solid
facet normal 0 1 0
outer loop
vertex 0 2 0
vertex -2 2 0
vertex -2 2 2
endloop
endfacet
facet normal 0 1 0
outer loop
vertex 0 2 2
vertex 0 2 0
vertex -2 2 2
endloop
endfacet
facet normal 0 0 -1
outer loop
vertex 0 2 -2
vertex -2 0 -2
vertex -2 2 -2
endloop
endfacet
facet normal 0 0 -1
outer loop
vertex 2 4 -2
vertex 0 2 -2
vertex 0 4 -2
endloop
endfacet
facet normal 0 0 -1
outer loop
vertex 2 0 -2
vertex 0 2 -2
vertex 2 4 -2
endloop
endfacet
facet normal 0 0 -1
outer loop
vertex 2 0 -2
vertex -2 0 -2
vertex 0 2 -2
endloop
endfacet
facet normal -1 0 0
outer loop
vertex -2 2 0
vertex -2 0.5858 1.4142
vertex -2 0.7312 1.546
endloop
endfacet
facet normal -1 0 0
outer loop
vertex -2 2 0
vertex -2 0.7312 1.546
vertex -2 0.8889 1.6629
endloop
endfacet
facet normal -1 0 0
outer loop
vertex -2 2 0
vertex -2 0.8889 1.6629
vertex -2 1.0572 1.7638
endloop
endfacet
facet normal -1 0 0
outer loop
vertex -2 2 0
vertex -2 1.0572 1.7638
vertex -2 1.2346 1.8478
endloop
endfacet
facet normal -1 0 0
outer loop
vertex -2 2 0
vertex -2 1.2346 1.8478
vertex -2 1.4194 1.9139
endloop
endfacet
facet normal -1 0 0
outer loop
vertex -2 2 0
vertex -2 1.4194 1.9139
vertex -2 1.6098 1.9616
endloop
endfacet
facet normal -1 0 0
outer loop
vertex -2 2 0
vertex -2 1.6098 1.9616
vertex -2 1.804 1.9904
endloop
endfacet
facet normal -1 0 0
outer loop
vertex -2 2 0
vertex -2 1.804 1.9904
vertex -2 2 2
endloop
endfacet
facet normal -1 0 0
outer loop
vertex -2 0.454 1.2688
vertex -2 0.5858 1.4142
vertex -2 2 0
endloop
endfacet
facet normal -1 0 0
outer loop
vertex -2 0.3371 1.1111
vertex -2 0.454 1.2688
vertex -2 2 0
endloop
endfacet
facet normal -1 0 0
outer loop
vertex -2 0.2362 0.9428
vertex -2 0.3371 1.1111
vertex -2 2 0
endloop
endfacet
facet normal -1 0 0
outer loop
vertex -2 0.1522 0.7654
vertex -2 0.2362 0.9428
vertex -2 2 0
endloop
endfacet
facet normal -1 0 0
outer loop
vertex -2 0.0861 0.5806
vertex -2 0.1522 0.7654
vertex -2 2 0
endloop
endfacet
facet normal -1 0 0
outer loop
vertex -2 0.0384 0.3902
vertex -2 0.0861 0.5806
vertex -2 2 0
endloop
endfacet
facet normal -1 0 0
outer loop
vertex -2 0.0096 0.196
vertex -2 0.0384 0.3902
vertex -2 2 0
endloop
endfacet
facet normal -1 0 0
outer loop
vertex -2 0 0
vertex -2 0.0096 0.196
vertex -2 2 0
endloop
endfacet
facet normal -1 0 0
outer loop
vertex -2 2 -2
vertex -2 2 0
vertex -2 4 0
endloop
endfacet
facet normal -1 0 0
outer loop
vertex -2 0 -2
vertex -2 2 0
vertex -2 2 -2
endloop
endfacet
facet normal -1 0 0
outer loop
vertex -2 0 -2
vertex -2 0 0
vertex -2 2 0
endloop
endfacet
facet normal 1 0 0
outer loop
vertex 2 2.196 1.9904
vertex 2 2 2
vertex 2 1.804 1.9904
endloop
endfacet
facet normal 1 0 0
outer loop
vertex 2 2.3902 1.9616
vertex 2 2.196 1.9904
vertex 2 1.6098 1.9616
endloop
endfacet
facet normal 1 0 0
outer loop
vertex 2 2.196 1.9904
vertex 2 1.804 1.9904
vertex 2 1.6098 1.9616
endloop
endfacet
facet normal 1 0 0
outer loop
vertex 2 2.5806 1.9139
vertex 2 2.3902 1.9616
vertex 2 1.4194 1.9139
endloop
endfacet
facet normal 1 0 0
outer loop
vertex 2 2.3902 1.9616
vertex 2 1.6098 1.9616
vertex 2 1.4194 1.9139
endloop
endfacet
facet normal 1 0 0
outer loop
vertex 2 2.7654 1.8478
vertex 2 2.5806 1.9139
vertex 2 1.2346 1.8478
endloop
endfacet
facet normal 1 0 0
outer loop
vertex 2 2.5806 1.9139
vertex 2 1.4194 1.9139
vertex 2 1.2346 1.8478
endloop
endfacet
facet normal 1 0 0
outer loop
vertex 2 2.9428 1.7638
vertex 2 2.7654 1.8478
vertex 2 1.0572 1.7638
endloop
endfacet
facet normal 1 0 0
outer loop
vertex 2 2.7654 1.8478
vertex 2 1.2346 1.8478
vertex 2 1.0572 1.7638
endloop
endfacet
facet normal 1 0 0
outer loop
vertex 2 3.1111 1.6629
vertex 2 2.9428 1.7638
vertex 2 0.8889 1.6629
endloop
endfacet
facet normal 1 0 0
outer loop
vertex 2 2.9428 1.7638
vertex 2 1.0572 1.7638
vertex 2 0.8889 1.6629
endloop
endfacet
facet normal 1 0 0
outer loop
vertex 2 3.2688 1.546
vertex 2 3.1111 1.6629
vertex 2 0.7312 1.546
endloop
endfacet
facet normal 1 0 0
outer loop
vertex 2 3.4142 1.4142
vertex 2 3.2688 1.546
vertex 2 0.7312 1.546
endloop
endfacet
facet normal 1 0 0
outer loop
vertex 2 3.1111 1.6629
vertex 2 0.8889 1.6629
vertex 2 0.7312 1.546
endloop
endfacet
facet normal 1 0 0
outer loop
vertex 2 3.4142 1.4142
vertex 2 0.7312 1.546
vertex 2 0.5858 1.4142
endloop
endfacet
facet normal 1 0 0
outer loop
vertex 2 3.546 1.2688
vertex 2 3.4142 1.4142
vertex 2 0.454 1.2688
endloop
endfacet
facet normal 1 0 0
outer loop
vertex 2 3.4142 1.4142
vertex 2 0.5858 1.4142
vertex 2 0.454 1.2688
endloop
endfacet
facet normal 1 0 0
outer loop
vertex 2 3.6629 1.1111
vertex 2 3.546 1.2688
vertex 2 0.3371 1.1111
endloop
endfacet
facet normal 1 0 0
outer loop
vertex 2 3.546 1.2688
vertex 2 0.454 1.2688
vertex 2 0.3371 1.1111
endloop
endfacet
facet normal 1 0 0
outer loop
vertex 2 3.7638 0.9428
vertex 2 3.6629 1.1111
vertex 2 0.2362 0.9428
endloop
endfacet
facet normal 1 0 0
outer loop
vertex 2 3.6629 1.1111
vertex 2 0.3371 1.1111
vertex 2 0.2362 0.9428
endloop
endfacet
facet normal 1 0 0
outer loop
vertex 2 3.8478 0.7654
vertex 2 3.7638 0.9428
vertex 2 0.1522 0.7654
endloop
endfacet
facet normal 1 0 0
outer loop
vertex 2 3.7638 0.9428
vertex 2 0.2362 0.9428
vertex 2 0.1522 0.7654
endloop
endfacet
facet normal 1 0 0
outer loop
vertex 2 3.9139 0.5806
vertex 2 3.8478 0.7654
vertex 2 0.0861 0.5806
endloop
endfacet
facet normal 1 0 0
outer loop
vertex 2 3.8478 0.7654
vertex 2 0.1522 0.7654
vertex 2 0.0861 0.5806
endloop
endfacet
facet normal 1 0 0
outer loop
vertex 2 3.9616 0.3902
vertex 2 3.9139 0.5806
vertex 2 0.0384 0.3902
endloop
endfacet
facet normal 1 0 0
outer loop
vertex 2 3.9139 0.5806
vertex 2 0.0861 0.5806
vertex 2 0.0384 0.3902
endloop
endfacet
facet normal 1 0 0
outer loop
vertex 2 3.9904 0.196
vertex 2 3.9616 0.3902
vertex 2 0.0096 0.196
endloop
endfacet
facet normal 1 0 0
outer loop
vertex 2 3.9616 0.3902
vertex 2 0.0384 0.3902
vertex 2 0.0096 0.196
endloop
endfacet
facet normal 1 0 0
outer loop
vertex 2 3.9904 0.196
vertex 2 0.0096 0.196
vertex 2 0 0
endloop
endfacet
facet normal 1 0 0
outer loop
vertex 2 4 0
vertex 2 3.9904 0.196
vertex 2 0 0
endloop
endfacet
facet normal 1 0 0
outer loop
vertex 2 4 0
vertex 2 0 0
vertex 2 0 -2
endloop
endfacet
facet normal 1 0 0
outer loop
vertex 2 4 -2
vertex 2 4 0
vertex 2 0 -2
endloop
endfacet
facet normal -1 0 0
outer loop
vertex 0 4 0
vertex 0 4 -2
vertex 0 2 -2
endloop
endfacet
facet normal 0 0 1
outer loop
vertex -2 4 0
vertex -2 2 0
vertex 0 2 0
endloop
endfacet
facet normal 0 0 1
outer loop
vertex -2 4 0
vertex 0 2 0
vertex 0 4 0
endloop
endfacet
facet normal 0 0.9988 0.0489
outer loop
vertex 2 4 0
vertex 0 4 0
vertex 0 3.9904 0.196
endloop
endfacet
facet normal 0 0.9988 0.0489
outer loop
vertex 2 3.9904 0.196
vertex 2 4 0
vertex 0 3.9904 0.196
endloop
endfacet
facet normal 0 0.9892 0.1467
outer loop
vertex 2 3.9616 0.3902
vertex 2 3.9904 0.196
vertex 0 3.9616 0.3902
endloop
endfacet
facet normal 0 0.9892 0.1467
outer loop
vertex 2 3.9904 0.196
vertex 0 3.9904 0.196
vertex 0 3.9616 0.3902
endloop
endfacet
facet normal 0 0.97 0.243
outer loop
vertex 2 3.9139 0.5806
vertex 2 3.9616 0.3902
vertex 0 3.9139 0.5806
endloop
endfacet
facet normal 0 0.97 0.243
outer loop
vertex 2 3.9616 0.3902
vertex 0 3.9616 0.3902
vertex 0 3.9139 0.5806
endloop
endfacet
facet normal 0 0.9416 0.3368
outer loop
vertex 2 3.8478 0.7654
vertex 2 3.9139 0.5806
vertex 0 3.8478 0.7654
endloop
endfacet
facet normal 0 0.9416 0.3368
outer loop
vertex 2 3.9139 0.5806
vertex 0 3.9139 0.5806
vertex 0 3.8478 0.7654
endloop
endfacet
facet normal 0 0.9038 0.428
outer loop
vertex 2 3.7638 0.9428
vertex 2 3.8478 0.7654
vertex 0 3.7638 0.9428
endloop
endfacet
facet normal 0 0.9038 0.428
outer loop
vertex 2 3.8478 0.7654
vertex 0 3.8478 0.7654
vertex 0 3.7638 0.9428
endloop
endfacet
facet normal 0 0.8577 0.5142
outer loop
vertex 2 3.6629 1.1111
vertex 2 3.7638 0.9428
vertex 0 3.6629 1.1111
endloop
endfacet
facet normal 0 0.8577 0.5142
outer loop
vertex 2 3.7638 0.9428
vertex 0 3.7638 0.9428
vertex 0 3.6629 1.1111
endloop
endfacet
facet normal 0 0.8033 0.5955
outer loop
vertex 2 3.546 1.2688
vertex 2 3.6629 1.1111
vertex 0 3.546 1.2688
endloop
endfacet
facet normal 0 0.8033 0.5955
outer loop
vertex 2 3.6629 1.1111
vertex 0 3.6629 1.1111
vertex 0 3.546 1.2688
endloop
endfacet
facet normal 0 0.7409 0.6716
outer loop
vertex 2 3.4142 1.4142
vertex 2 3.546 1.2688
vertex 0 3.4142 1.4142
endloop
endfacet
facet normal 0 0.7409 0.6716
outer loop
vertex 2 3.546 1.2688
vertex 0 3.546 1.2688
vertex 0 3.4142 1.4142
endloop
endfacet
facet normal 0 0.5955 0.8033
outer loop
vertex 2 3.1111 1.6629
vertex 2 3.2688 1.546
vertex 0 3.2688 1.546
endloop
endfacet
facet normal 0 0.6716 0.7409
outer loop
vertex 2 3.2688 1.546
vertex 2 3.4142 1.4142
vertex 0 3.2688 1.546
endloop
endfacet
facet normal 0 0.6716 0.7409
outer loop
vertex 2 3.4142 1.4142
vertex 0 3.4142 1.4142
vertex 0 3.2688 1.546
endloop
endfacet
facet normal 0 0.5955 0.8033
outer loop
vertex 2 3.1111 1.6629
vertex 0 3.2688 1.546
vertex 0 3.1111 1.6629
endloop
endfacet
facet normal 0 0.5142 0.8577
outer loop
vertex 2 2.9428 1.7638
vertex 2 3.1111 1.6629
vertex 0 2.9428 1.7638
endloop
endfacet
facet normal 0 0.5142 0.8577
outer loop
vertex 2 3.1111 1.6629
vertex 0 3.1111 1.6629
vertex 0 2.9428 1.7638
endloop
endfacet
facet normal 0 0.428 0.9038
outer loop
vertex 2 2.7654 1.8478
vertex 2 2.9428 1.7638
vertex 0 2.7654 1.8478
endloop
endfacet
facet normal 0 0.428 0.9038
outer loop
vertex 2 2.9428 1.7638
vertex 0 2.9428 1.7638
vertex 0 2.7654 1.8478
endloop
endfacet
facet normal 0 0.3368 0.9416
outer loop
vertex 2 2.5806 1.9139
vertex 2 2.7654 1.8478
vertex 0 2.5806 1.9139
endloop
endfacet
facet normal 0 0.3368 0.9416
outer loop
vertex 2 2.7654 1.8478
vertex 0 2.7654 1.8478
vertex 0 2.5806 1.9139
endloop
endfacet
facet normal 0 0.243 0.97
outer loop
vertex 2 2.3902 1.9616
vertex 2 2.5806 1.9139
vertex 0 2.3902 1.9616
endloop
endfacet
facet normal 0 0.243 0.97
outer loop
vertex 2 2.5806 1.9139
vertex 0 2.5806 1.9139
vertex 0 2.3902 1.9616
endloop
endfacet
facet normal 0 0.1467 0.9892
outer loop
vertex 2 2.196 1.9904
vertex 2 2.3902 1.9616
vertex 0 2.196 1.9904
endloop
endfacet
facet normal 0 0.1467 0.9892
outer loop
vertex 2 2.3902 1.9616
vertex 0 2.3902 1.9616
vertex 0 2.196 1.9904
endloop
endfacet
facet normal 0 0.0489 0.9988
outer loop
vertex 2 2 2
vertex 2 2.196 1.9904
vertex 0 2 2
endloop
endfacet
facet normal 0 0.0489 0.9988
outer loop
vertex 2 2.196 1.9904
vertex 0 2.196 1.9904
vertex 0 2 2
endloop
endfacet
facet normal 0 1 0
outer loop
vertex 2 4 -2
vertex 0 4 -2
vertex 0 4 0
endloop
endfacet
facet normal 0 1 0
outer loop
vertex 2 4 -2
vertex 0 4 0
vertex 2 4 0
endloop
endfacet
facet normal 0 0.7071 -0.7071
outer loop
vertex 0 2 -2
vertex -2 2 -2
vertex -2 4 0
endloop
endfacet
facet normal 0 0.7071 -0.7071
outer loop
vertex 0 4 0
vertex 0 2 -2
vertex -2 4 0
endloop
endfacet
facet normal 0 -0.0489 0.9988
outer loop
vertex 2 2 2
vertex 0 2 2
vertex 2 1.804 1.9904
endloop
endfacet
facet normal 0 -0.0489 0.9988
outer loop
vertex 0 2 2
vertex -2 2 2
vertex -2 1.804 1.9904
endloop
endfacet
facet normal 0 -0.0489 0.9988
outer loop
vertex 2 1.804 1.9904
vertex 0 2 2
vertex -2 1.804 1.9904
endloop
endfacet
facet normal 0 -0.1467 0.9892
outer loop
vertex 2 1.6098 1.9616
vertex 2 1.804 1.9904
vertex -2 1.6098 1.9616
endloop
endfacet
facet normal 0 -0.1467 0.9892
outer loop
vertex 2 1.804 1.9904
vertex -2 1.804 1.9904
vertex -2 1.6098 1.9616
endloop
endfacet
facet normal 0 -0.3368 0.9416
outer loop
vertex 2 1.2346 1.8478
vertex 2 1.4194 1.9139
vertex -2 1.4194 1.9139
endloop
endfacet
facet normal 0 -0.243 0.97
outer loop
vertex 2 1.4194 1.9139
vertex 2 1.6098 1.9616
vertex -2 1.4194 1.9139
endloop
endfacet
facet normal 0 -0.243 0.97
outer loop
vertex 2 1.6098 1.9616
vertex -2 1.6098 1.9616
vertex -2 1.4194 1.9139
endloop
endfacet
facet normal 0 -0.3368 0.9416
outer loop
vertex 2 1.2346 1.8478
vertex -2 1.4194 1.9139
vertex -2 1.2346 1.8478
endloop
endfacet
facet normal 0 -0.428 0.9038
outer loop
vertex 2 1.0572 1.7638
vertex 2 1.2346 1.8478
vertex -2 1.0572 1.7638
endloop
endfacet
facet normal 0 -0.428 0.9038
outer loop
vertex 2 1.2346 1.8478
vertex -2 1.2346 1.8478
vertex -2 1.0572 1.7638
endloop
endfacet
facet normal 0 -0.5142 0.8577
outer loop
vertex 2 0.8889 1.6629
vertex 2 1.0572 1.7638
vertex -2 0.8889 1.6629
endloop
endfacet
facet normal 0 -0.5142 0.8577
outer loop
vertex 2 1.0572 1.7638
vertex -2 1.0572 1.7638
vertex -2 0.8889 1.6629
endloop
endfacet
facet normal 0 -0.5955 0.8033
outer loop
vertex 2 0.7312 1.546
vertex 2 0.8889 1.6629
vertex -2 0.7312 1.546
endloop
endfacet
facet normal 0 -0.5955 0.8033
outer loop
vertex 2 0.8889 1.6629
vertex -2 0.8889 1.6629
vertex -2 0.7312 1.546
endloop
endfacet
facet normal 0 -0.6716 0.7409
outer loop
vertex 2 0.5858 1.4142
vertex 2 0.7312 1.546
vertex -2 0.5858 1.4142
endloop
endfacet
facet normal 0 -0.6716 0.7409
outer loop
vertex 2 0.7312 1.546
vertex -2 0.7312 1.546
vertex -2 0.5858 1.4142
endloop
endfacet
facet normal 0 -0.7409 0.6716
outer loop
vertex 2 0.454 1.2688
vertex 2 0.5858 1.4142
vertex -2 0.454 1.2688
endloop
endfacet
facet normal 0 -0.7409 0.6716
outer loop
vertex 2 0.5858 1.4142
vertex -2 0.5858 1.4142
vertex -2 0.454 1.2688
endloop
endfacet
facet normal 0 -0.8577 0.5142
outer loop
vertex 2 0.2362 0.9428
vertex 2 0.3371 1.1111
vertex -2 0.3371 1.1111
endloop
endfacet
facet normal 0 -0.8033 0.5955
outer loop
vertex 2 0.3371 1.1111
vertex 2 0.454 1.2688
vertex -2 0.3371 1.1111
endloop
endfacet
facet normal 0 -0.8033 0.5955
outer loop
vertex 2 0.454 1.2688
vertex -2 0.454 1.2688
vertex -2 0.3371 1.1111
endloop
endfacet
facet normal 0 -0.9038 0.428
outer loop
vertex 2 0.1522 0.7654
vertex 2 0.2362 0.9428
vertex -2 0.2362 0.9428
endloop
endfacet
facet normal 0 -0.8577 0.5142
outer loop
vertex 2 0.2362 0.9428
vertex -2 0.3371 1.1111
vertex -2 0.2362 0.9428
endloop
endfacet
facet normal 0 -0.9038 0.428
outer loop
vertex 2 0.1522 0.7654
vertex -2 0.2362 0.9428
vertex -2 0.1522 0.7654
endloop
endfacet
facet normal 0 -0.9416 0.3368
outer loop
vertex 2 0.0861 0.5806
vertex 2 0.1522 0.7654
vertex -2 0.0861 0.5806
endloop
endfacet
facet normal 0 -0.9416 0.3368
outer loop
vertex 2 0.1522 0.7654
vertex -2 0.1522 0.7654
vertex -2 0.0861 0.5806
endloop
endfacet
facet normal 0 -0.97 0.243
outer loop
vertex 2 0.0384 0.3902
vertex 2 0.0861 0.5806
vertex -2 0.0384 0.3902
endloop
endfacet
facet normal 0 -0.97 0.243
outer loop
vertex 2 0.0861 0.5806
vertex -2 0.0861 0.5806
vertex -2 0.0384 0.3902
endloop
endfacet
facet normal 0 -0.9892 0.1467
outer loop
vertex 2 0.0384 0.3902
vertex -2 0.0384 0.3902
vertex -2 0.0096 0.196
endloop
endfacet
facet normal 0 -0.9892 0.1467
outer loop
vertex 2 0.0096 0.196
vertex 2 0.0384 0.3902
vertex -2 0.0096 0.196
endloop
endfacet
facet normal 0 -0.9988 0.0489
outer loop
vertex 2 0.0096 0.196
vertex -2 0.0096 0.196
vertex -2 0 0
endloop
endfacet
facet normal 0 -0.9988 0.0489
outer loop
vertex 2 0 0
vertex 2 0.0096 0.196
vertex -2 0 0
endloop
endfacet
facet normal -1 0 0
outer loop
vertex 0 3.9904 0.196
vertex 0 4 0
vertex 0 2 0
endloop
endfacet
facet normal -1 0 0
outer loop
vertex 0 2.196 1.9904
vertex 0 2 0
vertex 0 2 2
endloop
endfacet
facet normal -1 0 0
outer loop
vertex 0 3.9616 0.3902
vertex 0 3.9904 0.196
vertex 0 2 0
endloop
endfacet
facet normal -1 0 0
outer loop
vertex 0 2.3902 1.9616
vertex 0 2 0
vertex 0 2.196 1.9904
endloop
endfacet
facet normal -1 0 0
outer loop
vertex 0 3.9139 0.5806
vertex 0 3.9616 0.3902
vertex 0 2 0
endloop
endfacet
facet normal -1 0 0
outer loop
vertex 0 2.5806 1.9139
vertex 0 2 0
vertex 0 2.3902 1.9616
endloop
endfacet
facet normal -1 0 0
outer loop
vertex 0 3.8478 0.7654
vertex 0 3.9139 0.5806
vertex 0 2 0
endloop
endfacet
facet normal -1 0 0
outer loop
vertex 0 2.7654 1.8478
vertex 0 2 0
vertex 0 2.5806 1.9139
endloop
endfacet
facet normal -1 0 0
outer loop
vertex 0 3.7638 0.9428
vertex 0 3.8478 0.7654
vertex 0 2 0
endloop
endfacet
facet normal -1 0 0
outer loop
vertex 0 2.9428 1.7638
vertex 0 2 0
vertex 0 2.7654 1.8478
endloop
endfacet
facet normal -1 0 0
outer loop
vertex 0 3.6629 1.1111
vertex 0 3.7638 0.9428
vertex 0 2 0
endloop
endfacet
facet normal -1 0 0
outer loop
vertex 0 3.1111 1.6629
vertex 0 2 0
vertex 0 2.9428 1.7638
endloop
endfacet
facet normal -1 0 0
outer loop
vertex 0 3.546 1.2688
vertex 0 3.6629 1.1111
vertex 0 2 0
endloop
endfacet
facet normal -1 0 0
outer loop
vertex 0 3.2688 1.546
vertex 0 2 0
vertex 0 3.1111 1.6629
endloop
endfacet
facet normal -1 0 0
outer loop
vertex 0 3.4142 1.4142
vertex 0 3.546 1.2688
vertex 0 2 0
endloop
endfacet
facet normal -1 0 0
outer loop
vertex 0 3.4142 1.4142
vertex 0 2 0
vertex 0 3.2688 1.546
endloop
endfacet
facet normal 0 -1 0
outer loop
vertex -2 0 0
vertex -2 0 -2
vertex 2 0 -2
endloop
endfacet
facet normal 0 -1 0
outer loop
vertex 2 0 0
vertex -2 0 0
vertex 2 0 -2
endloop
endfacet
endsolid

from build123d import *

# Parameters (mm, degrees)
SKETCH1_W           = 4
SKETCH1_H           = 4
BOSS_EXTRUDE1_DEPTH = 4
SKETCH2_W           = 2
SKETCH2_H           = 2
CUT_EXTRUDE1_DEPTH  = 2
CUT_EXTRUDE2_DEPTH  = 5


with BuildPart() as part:
    # Sketch1 → Boss-Extrude1 (new body)
    with BuildSketch(Plane(origin=(0, 0, 0), x_dir=(1, 0, 0), z_dir=(0, 1, 0))):
        Rectangle(SKETCH1_W, SKETCH1_H)
    extrude(amount=BOSS_EXTRUDE1_DEPTH)

    # Sketch2 → Cut-Extrude1 (cut)
    with BuildSketch(Plane.ZY.offset(2)):
        Polygon((-2, 4), (-2, 2), (0, 4), align=None)
        with Locations((1, 3)):
            Rectangle(SKETCH2_W, SKETCH2_H)
    extrude(amount=-CUT_EXTRUDE1_DEPTH, mode=Mode.SUBTRACT)

    # Sketch3 → Cut-Extrude2 (cut, symmetric)
    with BuildSketch(Plane.ZY):
        with BuildLine():
            ThreePointArc((0, 4), (1.414213562, 3.414213562), (2, 2))
            Line((2, 2), (2, 4))
            Line((2, 4), (0, 4))
        make_face()
        with BuildLine():
            Line((2, 0), (2, 2))
            ThreePointArc((2, 2), (1.414213562, 0.585786438), (0, 0))
            Line((0, 0), (2, 0))
        make_face()
    extrude(amount=CUT_EXTRUDE2_DEPTH, both=True, mode=Mode.SUBTRACT)


solid = part.part
